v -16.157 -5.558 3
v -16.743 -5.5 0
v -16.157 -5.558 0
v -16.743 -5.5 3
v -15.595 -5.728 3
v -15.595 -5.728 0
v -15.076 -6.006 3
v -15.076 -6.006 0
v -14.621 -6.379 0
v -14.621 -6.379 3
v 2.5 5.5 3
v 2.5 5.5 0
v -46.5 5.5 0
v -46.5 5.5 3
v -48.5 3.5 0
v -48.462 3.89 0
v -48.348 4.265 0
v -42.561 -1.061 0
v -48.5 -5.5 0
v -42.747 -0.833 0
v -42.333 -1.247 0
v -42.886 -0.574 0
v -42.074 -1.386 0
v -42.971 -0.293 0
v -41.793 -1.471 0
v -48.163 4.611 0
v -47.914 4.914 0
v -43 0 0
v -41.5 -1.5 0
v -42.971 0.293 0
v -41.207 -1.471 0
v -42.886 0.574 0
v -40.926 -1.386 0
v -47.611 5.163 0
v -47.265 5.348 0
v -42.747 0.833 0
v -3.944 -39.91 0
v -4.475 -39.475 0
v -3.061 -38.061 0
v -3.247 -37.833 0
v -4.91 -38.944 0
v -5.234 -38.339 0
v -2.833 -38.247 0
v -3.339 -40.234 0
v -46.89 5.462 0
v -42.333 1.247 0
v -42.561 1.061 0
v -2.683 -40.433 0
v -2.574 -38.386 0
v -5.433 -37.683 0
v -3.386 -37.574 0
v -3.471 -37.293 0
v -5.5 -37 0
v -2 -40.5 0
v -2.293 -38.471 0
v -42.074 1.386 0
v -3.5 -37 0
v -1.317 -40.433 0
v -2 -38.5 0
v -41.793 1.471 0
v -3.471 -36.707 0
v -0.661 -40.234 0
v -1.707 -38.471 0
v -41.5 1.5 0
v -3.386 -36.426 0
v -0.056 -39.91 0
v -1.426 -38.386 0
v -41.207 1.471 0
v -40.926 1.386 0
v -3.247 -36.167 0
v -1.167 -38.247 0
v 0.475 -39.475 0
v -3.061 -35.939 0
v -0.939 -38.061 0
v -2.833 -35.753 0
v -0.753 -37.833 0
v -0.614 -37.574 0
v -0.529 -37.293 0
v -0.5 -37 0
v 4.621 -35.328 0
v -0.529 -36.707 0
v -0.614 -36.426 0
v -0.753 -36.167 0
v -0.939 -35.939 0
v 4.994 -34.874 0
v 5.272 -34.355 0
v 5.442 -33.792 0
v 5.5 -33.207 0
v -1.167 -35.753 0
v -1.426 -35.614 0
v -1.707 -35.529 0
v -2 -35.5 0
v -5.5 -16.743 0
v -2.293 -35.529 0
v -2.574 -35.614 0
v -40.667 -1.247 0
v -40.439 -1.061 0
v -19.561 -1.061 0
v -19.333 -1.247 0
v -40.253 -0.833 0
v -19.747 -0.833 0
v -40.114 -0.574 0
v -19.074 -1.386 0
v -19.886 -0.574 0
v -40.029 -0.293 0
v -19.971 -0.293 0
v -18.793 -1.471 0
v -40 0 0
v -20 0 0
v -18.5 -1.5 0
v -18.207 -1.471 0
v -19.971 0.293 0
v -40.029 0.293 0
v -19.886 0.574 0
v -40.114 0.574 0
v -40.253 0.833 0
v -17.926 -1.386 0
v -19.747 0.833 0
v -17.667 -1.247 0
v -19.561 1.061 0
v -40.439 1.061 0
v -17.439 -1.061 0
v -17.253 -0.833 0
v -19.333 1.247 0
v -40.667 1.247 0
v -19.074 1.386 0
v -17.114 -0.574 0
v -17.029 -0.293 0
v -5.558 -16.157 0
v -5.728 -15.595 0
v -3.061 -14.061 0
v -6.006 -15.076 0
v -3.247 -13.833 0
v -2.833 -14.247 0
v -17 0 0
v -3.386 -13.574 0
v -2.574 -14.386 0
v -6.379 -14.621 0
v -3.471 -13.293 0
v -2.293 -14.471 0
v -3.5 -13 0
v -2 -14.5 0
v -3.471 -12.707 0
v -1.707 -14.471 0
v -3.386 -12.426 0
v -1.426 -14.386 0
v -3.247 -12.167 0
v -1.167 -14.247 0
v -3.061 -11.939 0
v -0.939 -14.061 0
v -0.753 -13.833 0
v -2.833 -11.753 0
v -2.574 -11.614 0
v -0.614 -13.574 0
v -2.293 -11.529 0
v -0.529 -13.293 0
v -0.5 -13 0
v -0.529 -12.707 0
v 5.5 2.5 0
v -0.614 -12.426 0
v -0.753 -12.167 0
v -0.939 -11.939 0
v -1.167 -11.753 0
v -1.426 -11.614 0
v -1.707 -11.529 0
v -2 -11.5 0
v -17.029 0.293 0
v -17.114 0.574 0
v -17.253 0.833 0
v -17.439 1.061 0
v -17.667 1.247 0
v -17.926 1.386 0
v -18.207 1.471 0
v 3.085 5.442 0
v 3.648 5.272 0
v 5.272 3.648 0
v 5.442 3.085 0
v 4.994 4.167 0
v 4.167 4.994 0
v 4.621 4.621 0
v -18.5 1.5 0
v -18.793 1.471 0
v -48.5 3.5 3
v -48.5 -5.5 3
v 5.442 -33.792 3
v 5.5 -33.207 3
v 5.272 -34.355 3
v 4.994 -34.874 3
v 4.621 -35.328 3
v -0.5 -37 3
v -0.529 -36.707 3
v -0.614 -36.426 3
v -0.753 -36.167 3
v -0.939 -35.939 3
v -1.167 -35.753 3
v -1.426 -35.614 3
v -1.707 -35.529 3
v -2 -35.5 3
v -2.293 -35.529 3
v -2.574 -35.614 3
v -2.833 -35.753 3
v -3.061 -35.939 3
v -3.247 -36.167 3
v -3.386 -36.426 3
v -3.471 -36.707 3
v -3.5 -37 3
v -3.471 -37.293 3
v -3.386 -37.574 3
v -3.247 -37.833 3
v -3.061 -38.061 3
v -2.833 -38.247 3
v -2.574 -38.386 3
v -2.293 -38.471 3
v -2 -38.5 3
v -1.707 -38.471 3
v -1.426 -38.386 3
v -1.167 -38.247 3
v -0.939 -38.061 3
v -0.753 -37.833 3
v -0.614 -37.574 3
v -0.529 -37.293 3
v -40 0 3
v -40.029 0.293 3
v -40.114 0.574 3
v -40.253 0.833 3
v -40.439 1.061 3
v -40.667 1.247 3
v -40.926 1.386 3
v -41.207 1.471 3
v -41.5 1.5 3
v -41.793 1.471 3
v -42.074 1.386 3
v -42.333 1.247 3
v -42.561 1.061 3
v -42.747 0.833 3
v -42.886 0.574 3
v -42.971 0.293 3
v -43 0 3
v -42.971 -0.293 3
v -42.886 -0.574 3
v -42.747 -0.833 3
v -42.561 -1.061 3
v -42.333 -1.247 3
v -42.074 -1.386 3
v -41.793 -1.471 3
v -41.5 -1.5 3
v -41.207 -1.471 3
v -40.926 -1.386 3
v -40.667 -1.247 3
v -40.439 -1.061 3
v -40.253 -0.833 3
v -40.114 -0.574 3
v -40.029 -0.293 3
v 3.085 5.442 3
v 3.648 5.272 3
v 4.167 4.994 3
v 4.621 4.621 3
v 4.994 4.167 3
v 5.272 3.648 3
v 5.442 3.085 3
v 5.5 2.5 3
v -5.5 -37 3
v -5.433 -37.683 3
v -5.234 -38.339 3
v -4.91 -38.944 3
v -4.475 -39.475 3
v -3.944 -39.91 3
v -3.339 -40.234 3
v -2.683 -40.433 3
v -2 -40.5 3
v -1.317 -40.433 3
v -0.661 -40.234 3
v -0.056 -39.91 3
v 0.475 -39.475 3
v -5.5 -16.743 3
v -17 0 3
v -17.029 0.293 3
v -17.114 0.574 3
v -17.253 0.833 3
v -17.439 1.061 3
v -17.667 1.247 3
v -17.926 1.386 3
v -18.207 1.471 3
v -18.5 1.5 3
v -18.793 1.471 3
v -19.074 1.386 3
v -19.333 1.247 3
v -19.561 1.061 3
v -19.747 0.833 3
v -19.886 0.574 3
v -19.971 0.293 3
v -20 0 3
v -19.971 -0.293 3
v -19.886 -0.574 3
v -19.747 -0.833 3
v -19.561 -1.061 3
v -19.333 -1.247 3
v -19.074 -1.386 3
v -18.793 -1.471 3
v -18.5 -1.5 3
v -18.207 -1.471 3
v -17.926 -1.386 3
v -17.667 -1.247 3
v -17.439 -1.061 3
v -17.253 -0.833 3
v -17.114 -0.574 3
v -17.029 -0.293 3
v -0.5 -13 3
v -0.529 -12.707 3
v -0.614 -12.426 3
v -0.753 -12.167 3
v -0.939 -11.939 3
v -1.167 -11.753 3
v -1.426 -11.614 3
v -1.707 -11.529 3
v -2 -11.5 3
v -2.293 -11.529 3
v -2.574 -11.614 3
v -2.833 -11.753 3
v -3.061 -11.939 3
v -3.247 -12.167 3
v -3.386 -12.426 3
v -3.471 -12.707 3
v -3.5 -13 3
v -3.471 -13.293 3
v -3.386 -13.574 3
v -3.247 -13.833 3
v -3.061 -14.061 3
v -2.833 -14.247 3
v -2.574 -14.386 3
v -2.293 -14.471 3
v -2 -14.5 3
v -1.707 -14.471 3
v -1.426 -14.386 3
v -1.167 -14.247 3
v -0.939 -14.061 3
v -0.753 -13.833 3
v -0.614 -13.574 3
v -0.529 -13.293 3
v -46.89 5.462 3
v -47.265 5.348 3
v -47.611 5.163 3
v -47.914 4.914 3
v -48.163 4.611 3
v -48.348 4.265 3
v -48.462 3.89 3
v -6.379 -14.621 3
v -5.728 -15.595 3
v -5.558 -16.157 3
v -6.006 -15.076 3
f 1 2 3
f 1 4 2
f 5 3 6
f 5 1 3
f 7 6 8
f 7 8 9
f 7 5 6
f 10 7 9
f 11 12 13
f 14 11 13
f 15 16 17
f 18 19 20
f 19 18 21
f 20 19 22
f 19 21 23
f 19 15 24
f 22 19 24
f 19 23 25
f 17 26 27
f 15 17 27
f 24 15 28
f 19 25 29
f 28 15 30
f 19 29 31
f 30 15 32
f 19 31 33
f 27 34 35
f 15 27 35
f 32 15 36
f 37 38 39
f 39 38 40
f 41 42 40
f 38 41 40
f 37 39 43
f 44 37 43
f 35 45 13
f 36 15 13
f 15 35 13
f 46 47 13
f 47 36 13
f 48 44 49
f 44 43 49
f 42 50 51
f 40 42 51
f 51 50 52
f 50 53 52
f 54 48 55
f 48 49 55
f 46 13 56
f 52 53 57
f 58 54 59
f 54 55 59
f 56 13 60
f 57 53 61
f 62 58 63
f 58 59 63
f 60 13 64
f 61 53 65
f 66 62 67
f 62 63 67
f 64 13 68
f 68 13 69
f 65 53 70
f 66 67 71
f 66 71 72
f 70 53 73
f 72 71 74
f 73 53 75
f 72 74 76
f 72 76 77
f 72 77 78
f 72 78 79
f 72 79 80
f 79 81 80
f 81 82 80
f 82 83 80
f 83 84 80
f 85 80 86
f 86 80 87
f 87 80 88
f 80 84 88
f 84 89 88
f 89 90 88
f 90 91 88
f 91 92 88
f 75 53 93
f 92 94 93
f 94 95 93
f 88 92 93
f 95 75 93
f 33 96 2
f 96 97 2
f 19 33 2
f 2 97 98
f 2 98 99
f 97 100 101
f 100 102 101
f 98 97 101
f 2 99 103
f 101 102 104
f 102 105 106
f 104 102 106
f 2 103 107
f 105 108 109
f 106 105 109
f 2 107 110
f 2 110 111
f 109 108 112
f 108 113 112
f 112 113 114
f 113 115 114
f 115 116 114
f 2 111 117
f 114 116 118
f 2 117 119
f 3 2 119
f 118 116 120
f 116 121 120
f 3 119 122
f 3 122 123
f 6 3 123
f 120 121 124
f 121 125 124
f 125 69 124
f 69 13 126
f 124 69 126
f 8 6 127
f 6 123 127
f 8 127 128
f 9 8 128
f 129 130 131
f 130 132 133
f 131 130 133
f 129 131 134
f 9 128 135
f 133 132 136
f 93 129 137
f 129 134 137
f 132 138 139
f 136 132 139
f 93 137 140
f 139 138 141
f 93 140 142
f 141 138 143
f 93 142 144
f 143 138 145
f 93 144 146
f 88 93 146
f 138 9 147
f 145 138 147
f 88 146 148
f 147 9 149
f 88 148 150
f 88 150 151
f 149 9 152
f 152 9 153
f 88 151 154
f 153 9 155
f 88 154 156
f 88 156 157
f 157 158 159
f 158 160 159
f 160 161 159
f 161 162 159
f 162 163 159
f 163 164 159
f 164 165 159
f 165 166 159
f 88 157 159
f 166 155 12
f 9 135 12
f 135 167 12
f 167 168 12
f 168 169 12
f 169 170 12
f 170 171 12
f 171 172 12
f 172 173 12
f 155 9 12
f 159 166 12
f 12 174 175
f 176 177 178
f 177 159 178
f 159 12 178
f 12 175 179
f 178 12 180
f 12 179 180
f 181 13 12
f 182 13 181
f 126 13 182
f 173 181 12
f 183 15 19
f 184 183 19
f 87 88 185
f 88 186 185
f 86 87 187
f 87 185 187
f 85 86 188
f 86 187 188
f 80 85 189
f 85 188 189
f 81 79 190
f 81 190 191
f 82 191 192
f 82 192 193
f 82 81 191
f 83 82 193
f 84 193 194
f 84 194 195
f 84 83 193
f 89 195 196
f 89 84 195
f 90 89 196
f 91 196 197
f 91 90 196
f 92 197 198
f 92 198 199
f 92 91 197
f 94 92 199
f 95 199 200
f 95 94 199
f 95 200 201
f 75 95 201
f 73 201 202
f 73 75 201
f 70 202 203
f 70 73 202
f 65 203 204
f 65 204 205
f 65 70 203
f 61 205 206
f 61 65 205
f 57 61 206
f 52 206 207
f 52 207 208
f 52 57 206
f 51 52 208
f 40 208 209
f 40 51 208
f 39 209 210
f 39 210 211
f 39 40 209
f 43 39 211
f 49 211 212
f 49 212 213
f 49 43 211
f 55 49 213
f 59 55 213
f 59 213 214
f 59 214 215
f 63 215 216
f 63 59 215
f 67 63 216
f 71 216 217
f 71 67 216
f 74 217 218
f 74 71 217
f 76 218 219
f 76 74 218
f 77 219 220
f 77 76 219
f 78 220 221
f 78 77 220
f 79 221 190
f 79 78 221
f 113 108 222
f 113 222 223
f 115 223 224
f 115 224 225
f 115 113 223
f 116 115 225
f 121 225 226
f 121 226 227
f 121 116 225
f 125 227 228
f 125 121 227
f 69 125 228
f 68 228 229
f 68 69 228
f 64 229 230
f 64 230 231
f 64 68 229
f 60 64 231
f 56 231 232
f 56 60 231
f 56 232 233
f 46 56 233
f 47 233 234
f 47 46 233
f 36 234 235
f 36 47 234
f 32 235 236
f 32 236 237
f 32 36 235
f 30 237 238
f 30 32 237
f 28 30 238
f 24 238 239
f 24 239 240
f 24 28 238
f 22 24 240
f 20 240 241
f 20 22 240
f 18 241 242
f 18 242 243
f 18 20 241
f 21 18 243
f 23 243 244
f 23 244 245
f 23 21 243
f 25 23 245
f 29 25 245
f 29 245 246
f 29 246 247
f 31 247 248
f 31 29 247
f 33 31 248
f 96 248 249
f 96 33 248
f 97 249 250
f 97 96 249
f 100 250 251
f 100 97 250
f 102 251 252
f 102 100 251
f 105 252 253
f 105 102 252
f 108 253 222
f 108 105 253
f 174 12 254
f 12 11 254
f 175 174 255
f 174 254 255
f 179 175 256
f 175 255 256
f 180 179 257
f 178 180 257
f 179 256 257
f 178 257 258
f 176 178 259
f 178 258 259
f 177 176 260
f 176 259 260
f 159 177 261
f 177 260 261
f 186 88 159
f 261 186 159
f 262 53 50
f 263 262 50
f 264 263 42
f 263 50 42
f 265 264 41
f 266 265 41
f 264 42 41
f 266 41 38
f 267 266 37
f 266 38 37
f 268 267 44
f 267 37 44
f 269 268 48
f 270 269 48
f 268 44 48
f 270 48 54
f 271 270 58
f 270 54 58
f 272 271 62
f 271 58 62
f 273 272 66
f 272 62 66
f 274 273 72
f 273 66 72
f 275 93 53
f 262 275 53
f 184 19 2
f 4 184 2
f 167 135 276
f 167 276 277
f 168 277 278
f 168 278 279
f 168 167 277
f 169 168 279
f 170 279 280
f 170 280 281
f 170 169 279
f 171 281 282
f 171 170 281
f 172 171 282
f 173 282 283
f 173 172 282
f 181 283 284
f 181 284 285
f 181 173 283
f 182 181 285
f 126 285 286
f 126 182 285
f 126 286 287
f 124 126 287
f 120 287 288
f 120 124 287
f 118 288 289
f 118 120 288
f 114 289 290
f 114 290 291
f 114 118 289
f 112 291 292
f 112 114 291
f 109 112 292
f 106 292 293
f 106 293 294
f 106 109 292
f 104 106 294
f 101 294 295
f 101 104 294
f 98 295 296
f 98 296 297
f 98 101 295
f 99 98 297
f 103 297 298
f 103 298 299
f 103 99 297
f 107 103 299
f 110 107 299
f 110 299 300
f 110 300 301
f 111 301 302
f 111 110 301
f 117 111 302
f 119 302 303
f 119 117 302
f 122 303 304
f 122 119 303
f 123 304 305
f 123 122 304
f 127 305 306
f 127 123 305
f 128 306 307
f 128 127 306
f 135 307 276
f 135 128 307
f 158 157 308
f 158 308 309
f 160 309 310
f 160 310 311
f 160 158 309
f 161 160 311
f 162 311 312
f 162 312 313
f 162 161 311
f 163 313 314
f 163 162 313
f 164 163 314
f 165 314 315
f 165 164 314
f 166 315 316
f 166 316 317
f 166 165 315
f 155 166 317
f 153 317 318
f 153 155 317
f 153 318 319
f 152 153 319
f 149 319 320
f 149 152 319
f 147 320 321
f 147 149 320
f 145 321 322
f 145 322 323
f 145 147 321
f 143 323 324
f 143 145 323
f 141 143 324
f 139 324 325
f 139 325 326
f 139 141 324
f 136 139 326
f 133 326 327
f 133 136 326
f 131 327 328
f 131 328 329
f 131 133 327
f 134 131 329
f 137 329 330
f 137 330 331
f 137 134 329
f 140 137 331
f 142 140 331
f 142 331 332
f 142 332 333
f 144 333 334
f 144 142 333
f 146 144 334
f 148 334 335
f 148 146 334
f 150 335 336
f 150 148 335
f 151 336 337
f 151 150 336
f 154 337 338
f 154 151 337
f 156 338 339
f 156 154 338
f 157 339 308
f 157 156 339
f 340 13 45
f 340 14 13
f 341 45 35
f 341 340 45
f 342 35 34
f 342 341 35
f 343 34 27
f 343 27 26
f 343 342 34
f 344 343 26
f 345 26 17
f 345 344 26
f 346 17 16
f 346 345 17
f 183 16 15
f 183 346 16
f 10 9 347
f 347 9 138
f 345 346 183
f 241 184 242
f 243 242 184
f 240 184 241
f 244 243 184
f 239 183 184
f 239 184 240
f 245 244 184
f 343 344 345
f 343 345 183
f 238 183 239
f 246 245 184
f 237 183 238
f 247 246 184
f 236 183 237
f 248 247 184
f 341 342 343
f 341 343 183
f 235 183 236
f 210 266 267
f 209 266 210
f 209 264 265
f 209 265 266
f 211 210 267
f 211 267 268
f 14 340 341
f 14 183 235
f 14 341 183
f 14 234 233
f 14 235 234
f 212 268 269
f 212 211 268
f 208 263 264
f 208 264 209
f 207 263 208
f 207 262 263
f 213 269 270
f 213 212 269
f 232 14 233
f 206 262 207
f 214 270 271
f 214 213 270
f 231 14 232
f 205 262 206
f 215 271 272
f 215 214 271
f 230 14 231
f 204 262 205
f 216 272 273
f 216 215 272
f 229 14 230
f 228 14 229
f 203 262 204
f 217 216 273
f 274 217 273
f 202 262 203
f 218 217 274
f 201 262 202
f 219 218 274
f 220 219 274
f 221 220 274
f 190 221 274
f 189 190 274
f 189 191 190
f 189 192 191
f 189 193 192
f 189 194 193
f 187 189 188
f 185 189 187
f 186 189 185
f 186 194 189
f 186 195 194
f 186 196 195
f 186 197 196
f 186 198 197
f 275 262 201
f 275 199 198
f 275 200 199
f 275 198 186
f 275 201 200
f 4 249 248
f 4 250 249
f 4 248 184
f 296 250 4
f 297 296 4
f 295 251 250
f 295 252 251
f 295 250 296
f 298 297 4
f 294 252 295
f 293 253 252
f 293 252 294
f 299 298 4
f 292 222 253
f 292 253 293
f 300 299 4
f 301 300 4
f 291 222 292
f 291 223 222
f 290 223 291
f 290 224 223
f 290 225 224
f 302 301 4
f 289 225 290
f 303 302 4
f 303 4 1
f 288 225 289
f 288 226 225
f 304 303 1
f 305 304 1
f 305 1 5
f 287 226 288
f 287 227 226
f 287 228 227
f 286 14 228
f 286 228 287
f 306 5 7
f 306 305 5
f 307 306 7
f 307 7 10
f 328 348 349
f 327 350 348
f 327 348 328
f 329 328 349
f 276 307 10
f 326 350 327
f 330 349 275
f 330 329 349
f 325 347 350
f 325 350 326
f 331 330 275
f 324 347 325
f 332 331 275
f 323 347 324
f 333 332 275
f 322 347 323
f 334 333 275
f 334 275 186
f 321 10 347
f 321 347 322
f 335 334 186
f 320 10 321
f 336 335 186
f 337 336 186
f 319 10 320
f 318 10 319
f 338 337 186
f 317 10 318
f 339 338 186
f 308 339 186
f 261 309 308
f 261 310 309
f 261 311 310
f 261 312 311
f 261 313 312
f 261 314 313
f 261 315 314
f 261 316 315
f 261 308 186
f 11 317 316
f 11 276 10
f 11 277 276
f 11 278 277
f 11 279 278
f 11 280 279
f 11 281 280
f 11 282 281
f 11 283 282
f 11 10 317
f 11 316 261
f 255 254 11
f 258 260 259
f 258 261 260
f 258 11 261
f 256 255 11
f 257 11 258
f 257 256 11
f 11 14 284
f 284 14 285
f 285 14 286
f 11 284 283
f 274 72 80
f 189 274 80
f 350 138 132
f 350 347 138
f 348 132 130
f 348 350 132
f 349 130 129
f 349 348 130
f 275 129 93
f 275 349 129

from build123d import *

# Parameters (mm, degrees)
SKETCH_1_R         = 1.5
EXTRUDE_1052_DEPTH = 3
FILLET1_R          = 3
FILLET_1_R         = 2


with BuildPart() as part:
    # Эскиз1 → Extrude 1052 (new body)
    with BuildSketch(Plane.XY):
        with BuildLine():
            Line((-48.5, 5.5), (-48.5, -5.5))
            Line((-48.5, -5.5), (-15.5, -5.5))
            Line((-15.5, -5.5), (-5.5, -15.5))
            Line((-5.5, -15.5), (-5.5, -37))
            ThreePointArc((-5.5, -37), (-3.339392013, -40.233578364), (0.474873734, -39.474873734))
            Line((0.474873734, -39.474873734), (5.5, -34.449747468))
            Line((5.5, -34.449747468), (5.5, 5.5))
            Line((5.5, 5.5), (-48.5, 5.5))
        make_face()
        with Locations((-18.5, 0)):
            Circle(SKETCH_1_R, mode=Mode.SUBTRACT)
        with Locations((-41.5, 0)):
            Circle(SKETCH_1_R, mode=Mode.SUBTRACT)
        with Locations((-2, -13)):
            Circle(SKETCH_1_R, mode=Mode.SUBTRACT)
        with Locations((-2, -37)):
            Circle(SKETCH_1_R, mode=Mode.SUBTRACT)
    extrude(amount=EXTRUDE_1052_DEPTH)

    # Fillet1
    fillet1_edges = [part.edges().sort_by_distance(p)[0] for p in [
        (-15.5, -5.5, 1.5),
        (-5.5, -15.5, 1.5),
        (5.5, -34.449747468, 1.5),
        (5.5, 5.5, 1.5),
    ]]
    fillet(fillet1_edges, radius=FILLET1_R)

    # Скругление1
    fillet_1_edges = [part.edges().sort_by_distance(p)[0] for p in [
        (-48.5, 5.5, 1.5),
    ]]
    fillet(fillet_1_edges, radius=FILLET_1_R)


solid = part.part
